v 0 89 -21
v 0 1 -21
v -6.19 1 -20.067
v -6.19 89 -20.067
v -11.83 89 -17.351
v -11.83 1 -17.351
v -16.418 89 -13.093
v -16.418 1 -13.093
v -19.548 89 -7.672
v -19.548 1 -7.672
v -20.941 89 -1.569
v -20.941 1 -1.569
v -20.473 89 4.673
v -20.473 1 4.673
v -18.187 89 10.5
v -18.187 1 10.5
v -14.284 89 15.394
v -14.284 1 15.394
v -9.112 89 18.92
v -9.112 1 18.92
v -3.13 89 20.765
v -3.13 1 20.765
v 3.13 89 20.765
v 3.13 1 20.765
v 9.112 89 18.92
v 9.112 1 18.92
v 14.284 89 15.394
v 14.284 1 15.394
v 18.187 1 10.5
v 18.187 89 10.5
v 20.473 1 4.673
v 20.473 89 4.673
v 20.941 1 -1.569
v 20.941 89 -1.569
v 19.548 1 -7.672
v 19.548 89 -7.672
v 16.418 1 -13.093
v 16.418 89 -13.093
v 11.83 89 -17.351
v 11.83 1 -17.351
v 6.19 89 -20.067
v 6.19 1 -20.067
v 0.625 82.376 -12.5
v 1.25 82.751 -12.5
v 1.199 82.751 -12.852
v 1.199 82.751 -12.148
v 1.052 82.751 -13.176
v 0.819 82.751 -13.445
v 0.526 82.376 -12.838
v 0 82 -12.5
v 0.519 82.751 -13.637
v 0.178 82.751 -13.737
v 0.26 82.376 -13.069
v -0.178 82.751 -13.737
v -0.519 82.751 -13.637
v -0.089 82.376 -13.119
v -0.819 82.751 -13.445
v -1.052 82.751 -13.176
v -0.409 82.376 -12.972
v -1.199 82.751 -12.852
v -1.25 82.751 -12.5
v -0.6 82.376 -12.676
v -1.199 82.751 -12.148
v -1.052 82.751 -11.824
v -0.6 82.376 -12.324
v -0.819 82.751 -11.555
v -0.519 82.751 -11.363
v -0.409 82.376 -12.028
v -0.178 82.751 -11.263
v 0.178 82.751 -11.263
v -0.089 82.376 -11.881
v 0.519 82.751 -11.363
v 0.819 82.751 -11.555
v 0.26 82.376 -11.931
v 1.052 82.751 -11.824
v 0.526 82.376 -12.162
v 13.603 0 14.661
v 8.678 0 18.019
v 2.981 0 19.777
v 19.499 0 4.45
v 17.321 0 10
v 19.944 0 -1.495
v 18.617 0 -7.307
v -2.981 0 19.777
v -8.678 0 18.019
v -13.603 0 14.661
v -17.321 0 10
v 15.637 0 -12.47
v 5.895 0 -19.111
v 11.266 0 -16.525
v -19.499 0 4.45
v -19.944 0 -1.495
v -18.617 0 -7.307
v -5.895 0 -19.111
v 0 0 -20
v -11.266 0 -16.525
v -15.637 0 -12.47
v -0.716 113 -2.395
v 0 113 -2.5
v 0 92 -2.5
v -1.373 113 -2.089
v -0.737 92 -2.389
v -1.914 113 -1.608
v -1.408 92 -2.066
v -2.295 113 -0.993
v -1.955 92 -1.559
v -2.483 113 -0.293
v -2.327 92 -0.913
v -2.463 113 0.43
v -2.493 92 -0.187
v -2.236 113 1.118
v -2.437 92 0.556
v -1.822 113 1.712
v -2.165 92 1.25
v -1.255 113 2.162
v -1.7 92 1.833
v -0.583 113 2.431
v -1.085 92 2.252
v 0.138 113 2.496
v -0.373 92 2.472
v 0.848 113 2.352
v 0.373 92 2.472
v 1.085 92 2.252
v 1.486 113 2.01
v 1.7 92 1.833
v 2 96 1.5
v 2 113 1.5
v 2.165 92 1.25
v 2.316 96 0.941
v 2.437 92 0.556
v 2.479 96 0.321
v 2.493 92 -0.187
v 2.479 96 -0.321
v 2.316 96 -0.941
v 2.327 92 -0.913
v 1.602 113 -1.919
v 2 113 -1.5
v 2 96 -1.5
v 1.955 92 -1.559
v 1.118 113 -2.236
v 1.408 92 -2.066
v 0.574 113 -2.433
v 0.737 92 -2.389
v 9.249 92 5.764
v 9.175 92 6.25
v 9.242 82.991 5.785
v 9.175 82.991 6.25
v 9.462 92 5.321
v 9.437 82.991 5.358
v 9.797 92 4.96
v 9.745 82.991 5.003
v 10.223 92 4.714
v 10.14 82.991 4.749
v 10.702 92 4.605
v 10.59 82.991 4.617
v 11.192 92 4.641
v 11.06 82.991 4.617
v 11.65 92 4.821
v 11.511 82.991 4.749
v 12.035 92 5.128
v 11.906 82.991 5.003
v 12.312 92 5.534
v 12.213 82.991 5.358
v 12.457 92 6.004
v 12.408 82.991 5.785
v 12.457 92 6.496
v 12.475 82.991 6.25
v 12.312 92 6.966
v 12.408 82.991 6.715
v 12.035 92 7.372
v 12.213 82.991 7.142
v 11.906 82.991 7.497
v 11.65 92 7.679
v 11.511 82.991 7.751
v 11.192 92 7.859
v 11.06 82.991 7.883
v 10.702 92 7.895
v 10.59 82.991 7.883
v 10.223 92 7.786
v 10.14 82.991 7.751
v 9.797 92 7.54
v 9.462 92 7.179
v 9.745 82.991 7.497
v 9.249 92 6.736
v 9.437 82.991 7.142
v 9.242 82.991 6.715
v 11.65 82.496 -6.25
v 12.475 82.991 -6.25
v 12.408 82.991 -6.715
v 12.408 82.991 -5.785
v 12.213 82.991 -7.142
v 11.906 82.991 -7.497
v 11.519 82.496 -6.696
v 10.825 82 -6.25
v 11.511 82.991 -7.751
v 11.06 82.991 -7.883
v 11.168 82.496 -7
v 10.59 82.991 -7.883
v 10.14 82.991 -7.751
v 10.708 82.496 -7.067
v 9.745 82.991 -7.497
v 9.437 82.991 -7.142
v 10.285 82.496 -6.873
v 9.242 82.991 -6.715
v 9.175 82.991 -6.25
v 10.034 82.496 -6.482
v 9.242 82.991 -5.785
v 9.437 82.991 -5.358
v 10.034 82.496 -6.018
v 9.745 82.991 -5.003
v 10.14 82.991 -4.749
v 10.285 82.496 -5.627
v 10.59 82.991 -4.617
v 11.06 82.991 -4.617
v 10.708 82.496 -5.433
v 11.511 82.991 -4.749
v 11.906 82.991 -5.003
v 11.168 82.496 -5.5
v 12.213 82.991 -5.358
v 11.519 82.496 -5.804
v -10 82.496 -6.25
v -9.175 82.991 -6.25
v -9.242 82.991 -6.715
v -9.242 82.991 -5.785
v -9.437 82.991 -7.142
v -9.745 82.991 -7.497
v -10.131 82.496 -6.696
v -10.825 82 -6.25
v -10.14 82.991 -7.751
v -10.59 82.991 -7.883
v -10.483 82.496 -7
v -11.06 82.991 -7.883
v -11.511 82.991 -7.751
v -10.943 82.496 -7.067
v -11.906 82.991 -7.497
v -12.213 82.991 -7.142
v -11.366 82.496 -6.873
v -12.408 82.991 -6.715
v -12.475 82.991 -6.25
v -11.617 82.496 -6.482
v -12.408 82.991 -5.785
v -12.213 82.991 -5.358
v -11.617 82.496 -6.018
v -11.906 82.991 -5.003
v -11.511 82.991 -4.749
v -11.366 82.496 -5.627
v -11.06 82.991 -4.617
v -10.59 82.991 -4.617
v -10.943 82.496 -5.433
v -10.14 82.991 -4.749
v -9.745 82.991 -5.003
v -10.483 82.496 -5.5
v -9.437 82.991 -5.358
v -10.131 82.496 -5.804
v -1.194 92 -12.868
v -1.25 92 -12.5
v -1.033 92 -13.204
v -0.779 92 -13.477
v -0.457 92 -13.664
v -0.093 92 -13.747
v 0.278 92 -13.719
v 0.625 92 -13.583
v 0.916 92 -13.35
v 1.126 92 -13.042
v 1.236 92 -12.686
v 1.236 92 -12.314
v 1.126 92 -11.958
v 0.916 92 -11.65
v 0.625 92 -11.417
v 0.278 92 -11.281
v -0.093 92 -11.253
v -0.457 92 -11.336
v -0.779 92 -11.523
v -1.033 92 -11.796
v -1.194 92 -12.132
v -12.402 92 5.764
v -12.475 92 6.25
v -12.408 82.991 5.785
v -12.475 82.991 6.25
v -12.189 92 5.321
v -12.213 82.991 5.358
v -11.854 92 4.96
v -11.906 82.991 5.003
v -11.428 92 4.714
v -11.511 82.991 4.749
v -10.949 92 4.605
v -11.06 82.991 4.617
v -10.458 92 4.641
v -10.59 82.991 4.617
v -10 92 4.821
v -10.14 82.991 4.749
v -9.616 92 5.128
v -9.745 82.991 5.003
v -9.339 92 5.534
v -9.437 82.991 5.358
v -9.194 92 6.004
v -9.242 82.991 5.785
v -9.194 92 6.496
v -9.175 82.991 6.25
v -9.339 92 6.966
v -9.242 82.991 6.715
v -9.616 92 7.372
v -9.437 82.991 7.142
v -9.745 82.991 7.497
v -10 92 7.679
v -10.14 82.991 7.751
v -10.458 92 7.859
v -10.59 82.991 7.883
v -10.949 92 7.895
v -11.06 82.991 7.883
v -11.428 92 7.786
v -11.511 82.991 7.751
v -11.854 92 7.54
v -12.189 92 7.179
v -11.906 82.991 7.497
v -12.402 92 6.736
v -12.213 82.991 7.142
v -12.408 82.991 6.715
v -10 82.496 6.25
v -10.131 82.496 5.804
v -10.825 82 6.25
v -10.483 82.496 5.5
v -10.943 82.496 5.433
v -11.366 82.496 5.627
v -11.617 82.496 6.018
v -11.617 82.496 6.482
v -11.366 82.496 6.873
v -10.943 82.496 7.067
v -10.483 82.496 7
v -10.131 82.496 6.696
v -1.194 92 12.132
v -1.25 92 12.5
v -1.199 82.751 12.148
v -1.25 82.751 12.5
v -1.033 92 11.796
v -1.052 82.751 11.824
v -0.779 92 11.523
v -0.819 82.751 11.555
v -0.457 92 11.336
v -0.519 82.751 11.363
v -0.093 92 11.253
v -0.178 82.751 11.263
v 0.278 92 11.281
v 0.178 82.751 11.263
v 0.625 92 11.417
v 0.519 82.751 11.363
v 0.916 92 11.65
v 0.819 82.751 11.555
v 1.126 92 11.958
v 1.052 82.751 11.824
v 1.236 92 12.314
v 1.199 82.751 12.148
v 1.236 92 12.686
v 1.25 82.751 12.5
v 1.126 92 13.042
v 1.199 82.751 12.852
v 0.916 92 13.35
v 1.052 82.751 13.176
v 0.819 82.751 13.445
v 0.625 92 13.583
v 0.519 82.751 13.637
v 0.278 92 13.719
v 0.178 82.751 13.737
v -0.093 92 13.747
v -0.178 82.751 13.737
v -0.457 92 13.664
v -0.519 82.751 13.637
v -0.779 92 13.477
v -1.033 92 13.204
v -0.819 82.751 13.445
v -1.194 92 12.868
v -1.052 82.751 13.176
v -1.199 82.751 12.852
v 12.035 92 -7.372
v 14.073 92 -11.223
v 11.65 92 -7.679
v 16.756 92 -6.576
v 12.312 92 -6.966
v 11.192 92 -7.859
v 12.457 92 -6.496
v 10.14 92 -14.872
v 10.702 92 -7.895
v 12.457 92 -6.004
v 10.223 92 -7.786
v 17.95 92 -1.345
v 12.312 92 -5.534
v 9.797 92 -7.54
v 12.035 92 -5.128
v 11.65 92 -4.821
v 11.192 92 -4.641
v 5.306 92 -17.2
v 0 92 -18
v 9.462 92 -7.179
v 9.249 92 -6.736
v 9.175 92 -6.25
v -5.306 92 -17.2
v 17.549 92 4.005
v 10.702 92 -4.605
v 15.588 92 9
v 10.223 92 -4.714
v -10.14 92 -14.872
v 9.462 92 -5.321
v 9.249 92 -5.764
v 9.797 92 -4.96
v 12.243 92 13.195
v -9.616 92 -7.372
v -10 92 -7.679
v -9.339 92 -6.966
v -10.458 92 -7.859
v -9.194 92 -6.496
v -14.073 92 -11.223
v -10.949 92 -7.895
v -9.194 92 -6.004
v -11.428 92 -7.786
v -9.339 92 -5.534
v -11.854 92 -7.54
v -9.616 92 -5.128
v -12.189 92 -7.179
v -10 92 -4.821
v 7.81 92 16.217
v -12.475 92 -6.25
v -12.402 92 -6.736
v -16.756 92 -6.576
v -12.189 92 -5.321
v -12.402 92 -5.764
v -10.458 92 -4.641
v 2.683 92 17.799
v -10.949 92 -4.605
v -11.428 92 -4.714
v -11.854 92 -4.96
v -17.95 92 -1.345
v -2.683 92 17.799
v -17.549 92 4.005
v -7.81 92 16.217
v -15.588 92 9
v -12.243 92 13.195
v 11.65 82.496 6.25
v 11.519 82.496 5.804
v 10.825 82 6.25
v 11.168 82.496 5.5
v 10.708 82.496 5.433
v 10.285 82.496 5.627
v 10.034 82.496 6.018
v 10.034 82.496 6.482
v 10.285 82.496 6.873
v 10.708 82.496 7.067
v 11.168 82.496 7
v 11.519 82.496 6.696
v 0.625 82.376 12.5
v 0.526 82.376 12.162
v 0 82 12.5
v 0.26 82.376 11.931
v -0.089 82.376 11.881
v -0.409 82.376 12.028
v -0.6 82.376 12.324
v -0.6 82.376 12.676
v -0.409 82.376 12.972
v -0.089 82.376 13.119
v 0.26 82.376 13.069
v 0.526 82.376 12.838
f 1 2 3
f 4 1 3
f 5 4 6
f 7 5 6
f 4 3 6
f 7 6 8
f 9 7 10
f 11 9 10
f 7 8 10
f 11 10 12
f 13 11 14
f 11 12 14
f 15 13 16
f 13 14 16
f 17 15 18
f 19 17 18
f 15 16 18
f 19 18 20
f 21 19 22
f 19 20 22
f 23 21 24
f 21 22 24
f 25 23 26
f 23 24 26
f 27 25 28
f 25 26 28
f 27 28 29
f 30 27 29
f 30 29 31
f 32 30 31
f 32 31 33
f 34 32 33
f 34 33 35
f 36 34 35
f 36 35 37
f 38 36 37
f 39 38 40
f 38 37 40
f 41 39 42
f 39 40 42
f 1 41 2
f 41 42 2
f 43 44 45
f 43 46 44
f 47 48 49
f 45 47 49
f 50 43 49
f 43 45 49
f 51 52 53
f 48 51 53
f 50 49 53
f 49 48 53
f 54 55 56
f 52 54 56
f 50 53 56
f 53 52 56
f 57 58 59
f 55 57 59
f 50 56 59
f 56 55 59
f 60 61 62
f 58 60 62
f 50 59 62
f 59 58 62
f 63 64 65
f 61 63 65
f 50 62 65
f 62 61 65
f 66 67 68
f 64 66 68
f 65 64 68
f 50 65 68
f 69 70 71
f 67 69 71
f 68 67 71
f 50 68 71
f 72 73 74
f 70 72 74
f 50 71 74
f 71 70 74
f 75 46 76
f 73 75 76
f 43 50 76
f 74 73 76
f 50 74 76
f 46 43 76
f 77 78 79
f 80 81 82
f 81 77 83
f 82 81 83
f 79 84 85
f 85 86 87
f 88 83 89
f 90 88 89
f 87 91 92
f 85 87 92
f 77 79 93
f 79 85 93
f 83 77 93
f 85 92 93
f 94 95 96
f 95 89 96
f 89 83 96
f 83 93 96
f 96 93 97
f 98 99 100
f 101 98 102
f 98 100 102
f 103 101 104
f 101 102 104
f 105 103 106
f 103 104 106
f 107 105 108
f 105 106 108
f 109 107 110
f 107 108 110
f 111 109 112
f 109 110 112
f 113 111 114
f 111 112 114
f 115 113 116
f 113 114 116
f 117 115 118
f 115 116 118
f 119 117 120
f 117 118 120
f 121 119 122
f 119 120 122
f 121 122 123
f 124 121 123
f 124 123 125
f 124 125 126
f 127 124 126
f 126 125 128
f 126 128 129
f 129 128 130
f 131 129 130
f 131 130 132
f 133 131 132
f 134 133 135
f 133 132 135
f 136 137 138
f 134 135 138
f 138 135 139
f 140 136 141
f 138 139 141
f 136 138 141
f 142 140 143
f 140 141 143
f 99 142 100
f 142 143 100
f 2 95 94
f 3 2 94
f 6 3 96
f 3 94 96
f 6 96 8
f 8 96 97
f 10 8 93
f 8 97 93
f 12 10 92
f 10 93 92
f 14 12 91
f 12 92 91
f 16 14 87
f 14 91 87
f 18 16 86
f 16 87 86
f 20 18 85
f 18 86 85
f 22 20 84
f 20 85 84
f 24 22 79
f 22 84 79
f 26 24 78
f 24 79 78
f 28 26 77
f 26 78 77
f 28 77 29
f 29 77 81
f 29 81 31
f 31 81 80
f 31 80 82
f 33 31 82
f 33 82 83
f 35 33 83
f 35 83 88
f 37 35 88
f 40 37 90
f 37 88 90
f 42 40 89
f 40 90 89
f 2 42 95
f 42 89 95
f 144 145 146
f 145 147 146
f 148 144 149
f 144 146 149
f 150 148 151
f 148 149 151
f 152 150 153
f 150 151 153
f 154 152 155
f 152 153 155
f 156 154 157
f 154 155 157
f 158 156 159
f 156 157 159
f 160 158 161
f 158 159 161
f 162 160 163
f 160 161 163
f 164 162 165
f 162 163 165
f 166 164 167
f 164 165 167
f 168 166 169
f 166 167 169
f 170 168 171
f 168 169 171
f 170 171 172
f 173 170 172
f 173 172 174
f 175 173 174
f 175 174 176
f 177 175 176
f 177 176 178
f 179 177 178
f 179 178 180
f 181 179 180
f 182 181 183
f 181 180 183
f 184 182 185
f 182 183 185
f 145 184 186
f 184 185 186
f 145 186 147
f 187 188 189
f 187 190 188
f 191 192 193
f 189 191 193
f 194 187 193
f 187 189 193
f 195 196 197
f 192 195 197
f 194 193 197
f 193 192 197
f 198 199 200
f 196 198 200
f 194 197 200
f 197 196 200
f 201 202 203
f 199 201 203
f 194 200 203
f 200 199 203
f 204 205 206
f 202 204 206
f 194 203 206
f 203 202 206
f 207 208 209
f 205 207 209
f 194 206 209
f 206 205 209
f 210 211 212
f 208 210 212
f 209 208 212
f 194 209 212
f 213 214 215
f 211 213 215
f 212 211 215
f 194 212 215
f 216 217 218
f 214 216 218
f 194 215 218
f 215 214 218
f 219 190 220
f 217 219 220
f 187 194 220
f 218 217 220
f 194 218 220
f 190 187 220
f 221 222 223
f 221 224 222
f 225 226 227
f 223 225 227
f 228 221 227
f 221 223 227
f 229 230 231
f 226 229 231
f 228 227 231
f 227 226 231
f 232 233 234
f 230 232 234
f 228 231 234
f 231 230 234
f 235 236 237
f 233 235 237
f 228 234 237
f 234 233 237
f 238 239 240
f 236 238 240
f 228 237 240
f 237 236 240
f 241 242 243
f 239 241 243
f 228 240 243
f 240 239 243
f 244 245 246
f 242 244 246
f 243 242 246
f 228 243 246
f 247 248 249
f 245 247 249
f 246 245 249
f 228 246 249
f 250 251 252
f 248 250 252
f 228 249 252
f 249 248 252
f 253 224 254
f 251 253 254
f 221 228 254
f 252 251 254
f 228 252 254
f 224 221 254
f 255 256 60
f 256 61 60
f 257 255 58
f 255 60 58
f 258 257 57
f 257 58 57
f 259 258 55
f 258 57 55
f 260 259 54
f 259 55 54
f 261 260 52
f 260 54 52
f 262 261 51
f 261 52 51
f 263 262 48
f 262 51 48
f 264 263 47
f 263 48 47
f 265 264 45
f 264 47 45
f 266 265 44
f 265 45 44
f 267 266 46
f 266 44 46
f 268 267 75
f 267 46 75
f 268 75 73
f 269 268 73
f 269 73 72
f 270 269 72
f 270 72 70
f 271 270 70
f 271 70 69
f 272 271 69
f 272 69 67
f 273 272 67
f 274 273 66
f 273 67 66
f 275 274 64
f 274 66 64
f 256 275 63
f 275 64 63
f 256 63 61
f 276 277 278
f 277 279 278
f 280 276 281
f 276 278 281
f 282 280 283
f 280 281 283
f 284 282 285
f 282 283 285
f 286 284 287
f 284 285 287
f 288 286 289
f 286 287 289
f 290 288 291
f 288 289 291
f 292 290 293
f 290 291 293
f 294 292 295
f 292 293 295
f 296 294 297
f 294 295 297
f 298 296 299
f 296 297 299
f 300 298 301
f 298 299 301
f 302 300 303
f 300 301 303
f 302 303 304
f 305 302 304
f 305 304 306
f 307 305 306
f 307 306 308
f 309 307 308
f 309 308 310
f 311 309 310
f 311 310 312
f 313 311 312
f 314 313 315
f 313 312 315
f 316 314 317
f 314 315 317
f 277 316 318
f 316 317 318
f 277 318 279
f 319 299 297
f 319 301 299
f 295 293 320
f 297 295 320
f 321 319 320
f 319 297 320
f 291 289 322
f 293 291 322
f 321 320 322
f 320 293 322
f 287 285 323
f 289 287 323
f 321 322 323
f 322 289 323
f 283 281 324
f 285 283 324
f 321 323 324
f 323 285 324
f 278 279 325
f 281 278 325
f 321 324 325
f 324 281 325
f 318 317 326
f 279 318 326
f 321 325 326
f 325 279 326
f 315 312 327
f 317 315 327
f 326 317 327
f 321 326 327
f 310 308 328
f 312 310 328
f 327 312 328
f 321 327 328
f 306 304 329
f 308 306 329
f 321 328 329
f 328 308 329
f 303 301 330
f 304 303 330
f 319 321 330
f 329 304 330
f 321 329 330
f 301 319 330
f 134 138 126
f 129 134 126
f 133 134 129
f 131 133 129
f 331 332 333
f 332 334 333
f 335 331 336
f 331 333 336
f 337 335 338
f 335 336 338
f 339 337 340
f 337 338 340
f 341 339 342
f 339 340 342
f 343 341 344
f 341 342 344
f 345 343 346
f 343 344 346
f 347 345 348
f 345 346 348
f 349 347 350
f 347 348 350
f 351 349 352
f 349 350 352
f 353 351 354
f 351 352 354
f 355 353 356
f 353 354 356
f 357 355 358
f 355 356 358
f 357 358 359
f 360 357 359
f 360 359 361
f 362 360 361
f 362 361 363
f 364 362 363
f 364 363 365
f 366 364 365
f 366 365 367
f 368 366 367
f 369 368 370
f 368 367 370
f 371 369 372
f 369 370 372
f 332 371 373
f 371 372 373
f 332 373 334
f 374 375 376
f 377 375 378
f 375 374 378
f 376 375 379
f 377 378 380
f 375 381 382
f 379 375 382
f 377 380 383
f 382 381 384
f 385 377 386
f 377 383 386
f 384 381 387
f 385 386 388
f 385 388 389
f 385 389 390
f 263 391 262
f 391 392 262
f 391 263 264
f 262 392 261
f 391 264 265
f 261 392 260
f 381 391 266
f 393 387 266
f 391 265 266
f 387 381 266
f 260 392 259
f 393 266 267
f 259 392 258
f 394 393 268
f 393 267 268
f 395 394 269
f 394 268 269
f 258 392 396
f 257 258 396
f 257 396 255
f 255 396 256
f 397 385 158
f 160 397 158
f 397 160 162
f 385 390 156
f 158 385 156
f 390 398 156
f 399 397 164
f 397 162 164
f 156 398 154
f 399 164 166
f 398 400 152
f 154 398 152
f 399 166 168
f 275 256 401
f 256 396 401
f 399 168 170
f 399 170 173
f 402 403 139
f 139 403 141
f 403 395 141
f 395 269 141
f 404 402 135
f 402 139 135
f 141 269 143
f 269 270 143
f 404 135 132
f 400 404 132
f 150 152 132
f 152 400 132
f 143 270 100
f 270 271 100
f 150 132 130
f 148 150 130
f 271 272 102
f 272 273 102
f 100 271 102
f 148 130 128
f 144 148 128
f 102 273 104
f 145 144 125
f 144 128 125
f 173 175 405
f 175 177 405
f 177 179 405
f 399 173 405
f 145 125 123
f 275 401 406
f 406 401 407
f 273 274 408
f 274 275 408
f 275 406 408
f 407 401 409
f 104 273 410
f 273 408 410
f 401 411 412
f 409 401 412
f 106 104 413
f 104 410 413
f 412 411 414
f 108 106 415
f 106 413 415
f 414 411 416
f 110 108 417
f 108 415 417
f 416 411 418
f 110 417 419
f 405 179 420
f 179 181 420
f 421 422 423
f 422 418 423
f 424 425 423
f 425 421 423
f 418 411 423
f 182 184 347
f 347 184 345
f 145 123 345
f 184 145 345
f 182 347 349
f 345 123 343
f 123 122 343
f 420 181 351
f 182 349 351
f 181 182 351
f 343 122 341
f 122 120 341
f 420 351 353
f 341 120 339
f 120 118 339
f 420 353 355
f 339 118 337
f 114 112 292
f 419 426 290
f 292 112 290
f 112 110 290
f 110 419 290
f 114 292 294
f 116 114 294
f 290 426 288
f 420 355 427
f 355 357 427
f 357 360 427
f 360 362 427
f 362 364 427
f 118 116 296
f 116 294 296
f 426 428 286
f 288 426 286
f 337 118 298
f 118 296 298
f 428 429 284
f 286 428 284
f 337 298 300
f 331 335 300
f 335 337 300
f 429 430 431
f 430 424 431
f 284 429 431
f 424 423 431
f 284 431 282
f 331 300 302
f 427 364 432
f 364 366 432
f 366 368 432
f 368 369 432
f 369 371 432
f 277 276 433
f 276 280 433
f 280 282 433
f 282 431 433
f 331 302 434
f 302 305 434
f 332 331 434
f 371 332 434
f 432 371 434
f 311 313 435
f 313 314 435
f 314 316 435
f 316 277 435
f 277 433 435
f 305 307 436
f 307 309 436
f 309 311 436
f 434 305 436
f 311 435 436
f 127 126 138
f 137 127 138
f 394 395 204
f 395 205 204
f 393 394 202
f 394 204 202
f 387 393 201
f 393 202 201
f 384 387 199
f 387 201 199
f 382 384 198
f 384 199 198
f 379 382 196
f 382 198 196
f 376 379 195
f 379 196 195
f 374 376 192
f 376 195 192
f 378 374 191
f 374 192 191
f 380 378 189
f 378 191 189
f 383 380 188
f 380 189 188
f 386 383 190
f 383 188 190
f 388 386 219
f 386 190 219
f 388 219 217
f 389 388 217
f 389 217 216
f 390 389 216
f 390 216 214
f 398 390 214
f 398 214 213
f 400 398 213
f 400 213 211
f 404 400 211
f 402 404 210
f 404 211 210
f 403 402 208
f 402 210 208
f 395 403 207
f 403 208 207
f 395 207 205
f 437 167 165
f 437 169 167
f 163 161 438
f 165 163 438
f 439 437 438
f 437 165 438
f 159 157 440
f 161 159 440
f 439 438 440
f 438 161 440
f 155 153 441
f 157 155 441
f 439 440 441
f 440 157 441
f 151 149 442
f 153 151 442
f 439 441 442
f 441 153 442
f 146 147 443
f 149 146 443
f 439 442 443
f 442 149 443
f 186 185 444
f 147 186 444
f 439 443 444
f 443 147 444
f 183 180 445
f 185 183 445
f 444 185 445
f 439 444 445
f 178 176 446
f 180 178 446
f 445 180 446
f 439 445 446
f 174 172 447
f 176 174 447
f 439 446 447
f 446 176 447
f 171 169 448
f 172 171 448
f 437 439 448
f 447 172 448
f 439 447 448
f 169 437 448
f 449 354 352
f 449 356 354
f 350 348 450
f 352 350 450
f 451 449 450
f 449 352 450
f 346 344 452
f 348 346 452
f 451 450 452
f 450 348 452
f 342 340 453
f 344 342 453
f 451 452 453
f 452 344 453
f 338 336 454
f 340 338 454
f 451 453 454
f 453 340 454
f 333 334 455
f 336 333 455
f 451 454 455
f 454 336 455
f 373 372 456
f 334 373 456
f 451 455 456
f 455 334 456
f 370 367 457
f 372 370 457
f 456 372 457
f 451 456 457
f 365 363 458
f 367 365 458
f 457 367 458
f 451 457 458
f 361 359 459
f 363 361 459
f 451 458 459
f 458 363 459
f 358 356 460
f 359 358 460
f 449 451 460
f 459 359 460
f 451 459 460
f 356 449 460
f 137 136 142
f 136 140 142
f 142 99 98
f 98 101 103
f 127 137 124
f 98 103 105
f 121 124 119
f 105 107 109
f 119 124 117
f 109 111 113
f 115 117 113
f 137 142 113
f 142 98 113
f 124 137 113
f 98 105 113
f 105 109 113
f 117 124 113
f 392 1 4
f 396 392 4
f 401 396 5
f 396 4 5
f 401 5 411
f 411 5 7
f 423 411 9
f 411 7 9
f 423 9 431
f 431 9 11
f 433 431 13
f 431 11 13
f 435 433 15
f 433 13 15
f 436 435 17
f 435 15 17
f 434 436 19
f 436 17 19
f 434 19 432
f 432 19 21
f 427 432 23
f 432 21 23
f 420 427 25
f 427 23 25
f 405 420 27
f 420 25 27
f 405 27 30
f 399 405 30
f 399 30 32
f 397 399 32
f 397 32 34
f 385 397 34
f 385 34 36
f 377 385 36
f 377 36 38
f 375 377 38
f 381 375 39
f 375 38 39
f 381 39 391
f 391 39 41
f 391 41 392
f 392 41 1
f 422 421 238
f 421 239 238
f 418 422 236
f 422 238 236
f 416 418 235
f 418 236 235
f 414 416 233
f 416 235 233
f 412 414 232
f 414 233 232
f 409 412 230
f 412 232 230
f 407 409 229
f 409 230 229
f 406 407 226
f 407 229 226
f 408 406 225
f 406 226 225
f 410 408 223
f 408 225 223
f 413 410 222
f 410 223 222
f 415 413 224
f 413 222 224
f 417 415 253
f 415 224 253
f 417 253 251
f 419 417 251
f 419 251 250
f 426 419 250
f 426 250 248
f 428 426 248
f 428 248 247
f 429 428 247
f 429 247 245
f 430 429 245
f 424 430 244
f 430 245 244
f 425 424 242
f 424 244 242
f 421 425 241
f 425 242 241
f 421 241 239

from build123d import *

# Parameters (mm, degrees)
CUT_EXTRUDE1_START              = -17
CUT_EXTRUDE1_DEPTH              = 17
TAP_DRILL_FOR_M3X0_5_TAP1_D     = 2.5
TAP_DRILL_FOR_M3X0_5_TAP1_DEPTH = 9.248924226
TAP_DRILL_FOR_M3X0_5_TAP1_TIP   = 0.751075774
TAP_DRILL_FOR_M4X0_7_TAP1_D     = 3.3
TAP_DRILL_FOR_M4X0_7_TAP1_DEPTH = 9.008579979
TAP_DRILL_FOR_M4X0_7_TAP1_TIP   = 0.991420021
CHAMFER1_SIZE                   = 3
CHAMFER2_SIZE                   = 1


with BuildPart() as part:
    # Sketch1 → Revolve1 (revolve)
    with BuildSketch(Plane.XY, mode=Mode.PRIVATE) as revolve1_sk:
        Polygon((0, 0), (0, 113), (2.5, 113), (2.5, 92), (21, 92), (21, 0), align=None)
    revolve(revolve1_sk.sketch.rotate(Axis((0, 0, 0), (0, 1, 0)), 90), axis=Axis((0, 0, 0), (0, 1, 0)))

    # Sketch2 → Cut-Extrude1 (cut)
    with BuildSketch(Plane(origin=(0, 113, 0), x_dir=(1, 0, 0), z_dir=(0, 1, 0)).offset(CUT_EXTRUDE1_START)):
        with BuildLine():
            Line((2, -1.5), (2, 1.5))
            ThreePointArc((2, 1.5), (2.5, 0), (2, -1.5))
        make_face()
    extrude(amount=CUT_EXTRUDE1_DEPTH, mode=Mode.SUBTRACT)

    # Tap Drill for M3x0.5 Tap1
    with Locations(Plane(origin=(0, 92, 0), x_dir=(1, 0, 0), z_dir=(0, 1, 0))):
        with Locations((0, 12.5), (0, -12.5)):
            Hole(TAP_DRILL_FOR_M3X0_5_TAP1_D / 2, depth=TAP_DRILL_FOR_M3X0_5_TAP1_DEPTH)
            with Locations((0, 0, -(TAP_DRILL_FOR_M3X0_5_TAP1_DEPTH + TAP_DRILL_FOR_M3X0_5_TAP1_TIP / 2))):  # 118° drill point
                Cone(0, TAP_DRILL_FOR_M3X0_5_TAP1_D / 2, TAP_DRILL_FOR_M3X0_5_TAP1_TIP, mode=Mode.SUBTRACT)

    # Tap Drill for M4x0.7 Tap1
    with Locations(Plane(origin=(0, 92, 0), x_dir=(1, 0, 0), z_dir=(0, 1, 0))):
        with Locations((-10.825317547, 6.25), (-10.825317547, -6.25), (10.825317547, -6.25), (10.825317547, 6.25)):
            Hole(TAP_DRILL_FOR_M4X0_7_TAP1_D / 2, depth=TAP_DRILL_FOR_M4X0_7_TAP1_DEPTH)
            with Locations((0, 0, -(TAP_DRILL_FOR_M4X0_7_TAP1_DEPTH + TAP_DRILL_FOR_M4X0_7_TAP1_TIP / 2))):  # 118° drill point
                Cone(0, TAP_DRILL_FOR_M4X0_7_TAP1_D / 2, TAP_DRILL_FOR_M4X0_7_TAP1_TIP, mode=Mode.SUBTRACT)

    # Chamfer1
    chamfer1_edges = [part.edges().sort_by_distance(p)[0] for p in [
        (0, 92, 21),
    ]]
    chamfer(chamfer1_edges, length=CHAMFER1_SIZE)

    # Chamfer2
    chamfer2_edges = [part.edges().sort_by_distance(p)[0] for p in [
        (0, 0, 21),
    ]]
    chamfer(chamfer2_edges, length=CHAMFER2_SIZE)


solid = part.part
